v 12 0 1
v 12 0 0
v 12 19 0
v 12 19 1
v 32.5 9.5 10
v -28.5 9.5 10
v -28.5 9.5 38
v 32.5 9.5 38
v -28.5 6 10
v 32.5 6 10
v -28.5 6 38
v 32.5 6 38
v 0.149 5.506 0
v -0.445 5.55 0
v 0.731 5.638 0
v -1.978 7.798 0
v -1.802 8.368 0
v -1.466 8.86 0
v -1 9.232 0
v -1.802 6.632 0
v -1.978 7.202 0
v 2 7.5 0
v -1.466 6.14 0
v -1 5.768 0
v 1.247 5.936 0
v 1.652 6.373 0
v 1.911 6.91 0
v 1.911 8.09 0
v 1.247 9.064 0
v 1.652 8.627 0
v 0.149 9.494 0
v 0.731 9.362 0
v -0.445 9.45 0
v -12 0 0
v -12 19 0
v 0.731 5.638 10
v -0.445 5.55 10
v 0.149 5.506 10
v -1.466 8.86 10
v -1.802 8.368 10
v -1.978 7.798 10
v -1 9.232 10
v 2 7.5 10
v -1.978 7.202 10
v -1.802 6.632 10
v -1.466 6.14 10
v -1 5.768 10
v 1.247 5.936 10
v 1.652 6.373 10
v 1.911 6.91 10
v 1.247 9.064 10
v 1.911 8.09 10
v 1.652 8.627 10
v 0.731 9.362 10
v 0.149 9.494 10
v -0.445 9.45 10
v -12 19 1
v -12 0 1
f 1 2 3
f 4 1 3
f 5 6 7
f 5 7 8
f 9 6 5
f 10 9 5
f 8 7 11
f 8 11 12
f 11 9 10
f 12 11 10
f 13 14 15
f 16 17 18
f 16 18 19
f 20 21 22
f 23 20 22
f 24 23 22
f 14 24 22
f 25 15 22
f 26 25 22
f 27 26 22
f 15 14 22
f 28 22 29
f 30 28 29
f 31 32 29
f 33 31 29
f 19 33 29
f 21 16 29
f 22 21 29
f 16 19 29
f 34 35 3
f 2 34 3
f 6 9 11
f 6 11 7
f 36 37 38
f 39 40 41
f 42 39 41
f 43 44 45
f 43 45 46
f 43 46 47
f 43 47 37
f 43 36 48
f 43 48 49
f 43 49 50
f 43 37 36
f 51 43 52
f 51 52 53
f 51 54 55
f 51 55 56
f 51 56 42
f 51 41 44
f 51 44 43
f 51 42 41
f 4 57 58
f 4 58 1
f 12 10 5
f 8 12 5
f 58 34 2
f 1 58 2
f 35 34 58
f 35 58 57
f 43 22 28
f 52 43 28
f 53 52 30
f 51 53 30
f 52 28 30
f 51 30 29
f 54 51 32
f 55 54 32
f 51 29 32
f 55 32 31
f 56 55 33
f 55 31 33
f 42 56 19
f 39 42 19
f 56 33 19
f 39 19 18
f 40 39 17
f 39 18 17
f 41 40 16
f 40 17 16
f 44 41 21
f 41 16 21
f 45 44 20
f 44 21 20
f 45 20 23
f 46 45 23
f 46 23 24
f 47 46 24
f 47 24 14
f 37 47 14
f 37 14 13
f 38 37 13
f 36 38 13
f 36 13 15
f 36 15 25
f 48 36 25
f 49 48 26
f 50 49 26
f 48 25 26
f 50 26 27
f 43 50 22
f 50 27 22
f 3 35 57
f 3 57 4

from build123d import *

# Parameters (mm, degrees)
BOX_W          = 61
BOX_H          = 3.5
BOX_DEPTH      = 28
BOX001_W       = 24
BOX001_H       = 19
BOX001_DEPTH   = 1
CYLINDER_R     = 2
CYLINDER_DEPTH = 10


with BuildPart() as pantalla:
    # Box → Box (new body)
    with BuildSketch(Plane(origin=(-28.5, 6, 10), x_dir=(1, 0, 0), z_dir=(0, 0, 1))):
        with Locations((30.5, 1.75)):
            Rectangle(BOX_W, BOX_H)
    extrude(amount=BOX_DEPTH)


with BuildPart() as base:
    # Box001 → Box001 (new body)
    with BuildSketch(Plane(origin=(-12, 0, 0), x_dir=(1, 0, 0), z_dir=(0, 0, 1))):
        with Locations((12, 9.5)):
            Rectangle(BOX001_W, BOX001_H)
    extrude(amount=BOX001_DEPTH)


with BuildPart() as cilindro:
    # Cylinder → Cylinder (new body)
    with BuildSketch(Plane(origin=(0, 7.5, 0), x_dir=(1, 0, 0), z_dir=(0, 0, 1))):
        Circle(CYLINDER_R)
    extrude(amount=CYLINDER_DEPTH)


solid = Compound([pantalla.part, base.part, cilindro.part])
